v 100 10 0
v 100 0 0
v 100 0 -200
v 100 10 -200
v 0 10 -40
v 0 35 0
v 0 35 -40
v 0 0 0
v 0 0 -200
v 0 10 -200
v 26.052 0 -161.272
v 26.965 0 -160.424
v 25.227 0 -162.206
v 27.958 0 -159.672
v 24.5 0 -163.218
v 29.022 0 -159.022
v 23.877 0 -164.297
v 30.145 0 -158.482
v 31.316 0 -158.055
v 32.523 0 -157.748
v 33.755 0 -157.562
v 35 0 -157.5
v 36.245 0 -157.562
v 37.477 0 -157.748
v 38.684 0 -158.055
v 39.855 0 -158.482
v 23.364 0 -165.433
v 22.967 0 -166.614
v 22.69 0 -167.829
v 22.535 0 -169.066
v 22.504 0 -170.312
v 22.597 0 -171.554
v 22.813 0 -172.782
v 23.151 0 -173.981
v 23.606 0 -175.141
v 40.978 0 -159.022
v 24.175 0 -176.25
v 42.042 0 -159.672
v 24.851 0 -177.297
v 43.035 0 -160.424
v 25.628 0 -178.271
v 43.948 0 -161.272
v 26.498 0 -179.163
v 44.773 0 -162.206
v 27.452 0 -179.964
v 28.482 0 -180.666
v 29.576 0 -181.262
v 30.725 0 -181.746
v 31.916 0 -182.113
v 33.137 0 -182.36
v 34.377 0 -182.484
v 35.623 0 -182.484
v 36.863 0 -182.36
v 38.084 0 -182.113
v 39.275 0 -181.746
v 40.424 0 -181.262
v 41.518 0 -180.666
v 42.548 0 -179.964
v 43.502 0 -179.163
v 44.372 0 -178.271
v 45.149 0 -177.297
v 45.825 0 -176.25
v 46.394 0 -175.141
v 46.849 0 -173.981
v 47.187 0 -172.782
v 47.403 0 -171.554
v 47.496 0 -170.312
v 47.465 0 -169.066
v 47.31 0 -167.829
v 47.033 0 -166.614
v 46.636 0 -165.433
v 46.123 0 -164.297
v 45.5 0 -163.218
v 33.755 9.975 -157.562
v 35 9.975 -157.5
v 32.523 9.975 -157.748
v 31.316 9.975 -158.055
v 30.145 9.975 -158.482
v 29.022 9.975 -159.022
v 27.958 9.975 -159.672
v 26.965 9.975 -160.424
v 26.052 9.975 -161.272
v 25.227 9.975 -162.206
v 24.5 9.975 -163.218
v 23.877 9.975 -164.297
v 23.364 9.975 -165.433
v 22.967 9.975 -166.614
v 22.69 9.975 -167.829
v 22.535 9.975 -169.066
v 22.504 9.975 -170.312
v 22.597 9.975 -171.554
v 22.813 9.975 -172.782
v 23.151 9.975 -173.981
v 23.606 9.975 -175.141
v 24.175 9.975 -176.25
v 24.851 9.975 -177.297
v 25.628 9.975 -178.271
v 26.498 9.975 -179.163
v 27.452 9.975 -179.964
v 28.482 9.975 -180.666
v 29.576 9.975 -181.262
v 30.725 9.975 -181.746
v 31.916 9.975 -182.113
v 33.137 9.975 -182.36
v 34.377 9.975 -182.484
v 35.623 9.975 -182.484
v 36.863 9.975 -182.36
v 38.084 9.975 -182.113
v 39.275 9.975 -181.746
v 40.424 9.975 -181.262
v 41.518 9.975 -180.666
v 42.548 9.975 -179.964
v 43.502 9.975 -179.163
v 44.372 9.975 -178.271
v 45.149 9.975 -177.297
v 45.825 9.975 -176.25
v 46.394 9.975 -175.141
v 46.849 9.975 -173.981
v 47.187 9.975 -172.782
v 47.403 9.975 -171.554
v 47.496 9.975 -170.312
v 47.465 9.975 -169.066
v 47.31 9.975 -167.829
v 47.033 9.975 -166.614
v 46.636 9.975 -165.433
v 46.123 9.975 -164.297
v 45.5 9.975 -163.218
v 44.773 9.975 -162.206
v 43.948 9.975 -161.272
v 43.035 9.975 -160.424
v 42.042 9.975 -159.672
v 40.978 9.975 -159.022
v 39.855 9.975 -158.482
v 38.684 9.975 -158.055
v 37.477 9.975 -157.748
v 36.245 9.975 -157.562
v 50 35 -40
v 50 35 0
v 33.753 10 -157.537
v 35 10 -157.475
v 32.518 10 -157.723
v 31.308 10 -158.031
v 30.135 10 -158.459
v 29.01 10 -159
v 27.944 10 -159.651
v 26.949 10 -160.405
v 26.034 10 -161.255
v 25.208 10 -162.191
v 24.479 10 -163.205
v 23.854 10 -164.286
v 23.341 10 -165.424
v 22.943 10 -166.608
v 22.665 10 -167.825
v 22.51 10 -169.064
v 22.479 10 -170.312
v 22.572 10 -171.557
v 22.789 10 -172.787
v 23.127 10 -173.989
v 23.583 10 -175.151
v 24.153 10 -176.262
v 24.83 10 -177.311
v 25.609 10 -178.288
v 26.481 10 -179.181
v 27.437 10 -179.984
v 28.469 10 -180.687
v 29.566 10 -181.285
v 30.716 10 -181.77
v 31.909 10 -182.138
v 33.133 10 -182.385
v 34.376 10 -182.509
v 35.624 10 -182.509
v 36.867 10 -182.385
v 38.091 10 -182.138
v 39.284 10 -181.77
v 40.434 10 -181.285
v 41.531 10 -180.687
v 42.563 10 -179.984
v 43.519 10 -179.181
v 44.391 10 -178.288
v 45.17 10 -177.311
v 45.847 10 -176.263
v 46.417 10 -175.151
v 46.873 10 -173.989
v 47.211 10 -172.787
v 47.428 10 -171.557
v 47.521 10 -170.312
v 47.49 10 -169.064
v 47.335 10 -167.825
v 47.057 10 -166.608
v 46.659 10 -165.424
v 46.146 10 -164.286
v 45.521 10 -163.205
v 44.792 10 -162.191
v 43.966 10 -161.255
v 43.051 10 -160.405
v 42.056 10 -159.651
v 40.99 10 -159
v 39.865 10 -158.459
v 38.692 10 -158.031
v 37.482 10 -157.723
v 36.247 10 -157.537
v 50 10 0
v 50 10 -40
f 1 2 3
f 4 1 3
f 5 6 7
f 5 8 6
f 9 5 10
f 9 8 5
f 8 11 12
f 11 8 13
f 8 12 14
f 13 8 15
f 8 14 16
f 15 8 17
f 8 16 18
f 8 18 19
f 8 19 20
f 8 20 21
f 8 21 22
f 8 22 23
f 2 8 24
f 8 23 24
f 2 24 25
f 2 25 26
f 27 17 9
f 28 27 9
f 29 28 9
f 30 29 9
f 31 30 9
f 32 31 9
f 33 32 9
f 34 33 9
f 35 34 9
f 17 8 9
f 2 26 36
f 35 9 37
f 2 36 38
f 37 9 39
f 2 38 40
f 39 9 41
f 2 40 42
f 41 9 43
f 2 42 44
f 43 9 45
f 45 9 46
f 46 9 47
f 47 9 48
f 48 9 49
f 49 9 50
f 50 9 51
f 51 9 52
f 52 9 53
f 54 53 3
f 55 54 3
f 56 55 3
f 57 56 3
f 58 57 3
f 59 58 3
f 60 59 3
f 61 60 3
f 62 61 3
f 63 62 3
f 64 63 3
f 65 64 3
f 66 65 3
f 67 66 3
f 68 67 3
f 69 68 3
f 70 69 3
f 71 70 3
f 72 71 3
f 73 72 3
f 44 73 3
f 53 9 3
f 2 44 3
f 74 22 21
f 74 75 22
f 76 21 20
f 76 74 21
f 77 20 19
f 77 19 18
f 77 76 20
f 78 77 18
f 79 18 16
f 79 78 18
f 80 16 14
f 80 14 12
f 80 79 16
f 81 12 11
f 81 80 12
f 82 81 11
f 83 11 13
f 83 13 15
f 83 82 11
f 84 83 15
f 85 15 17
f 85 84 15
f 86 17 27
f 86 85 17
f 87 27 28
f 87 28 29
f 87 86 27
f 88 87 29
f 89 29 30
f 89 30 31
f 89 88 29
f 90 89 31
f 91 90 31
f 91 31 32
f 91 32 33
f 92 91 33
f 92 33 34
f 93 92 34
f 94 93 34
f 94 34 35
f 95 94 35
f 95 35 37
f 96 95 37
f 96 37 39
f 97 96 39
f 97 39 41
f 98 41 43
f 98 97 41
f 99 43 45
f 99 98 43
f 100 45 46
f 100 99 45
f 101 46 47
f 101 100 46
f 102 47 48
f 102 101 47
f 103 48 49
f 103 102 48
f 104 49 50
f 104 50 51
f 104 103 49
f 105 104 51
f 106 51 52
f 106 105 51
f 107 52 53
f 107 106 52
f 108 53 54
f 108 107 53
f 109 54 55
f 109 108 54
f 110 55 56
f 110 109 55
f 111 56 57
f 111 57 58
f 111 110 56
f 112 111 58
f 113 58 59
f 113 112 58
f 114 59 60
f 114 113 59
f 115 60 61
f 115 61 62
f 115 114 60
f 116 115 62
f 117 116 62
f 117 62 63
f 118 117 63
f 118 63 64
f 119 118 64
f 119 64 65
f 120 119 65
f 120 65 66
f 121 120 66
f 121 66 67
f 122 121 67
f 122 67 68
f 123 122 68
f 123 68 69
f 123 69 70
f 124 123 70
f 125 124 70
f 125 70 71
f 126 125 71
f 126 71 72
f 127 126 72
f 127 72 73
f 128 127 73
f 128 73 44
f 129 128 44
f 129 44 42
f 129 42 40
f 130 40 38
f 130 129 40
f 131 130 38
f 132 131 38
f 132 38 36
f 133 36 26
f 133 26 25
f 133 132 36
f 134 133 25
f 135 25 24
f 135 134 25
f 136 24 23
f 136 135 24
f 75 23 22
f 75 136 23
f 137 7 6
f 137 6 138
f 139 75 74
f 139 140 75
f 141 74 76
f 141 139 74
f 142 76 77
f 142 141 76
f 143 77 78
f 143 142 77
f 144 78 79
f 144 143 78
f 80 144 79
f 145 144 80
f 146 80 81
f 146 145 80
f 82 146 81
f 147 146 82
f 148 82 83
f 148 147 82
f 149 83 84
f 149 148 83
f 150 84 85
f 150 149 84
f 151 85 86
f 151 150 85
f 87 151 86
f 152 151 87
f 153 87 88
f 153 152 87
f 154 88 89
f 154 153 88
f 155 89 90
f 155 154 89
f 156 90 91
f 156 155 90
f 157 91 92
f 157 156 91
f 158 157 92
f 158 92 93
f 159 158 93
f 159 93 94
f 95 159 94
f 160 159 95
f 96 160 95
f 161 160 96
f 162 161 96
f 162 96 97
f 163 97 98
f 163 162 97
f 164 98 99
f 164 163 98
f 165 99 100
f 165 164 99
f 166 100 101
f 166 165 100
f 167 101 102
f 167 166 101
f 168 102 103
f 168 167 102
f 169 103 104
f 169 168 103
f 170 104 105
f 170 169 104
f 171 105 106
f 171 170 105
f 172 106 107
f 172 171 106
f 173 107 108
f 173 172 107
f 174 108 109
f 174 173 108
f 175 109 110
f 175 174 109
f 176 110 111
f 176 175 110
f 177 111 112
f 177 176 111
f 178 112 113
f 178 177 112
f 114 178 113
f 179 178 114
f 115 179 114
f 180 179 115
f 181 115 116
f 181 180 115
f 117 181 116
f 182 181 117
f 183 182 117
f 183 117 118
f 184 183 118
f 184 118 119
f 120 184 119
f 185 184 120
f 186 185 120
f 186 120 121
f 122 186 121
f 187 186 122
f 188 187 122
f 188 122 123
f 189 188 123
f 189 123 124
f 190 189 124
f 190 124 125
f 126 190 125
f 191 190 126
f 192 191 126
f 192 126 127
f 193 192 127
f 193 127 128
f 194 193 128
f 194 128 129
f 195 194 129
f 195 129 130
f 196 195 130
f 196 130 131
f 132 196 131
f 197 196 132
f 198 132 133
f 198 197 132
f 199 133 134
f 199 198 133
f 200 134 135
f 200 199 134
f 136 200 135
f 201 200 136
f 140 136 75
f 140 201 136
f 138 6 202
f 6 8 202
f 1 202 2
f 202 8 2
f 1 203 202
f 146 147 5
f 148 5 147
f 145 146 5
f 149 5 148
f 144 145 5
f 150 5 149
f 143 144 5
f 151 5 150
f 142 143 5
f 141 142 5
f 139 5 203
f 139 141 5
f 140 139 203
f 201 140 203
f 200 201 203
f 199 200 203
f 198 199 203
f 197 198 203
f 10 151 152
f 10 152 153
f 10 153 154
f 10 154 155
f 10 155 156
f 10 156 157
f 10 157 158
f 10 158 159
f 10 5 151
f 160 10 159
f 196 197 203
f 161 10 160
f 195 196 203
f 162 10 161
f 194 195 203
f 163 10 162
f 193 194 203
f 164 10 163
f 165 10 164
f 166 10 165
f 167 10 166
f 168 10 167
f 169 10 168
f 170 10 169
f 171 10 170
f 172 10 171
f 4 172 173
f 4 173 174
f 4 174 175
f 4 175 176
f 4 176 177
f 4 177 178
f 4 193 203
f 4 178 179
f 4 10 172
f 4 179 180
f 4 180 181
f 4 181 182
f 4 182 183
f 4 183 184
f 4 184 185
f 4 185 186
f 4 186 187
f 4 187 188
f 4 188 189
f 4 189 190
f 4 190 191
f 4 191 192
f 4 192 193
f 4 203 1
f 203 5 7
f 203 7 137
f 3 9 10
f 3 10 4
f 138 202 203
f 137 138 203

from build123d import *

# Parameters (mm, degrees)
SKETCH1_W           = 100
SKETCH1_H           = 200
BOSS_EXTRUDE1_DEPTH = 10
SKETCH3_W           = 50
SKETCH3_H           = 40
BOSS_EXTRUDE2_DEPTH = 25


with BuildPart() as part:
    # Sketch1 → Boss-Extrude1 (new body)
    with BuildSketch(Plane(origin=(0, 0, 0), x_dir=(1, 0, 0), z_dir=(0, 1, 0))):
        with Locations((50, 100)):
            Rectangle(SKETCH1_W, SKETCH1_H)
    extrude(amount=BOSS_EXTRUDE1_DEPTH)

    # Sketch3 → Boss-Extrude2 (add)
    with BuildSketch(Plane(origin=(0, 10, 0), x_dir=(1, 0, 0), z_dir=(0, 1, 0))):
        with Locations((25, 20)):
            Rectangle(SKETCH3_W, SKETCH3_H)
    extrude(amount=BOSS_EXTRUDE2_DEPTH)

    # Sketch9 → Ø25.0 (25) Diameter Hole2 (revolve, cut)
    with BuildSketch(Plane(origin=(35, 10, -170), x_dir=(0, 0, 1), z_dir=(1, 0, 0))):
        Polygon((0, 0), (0, 10), (12.5, 10), (12.5, 0.025), (12.525, 0), align=None)
    revolve(axis=Axis((35, 16.35, -170), (0, -1, 0)), mode=Mode.SUBTRACT)


solid = part.part
